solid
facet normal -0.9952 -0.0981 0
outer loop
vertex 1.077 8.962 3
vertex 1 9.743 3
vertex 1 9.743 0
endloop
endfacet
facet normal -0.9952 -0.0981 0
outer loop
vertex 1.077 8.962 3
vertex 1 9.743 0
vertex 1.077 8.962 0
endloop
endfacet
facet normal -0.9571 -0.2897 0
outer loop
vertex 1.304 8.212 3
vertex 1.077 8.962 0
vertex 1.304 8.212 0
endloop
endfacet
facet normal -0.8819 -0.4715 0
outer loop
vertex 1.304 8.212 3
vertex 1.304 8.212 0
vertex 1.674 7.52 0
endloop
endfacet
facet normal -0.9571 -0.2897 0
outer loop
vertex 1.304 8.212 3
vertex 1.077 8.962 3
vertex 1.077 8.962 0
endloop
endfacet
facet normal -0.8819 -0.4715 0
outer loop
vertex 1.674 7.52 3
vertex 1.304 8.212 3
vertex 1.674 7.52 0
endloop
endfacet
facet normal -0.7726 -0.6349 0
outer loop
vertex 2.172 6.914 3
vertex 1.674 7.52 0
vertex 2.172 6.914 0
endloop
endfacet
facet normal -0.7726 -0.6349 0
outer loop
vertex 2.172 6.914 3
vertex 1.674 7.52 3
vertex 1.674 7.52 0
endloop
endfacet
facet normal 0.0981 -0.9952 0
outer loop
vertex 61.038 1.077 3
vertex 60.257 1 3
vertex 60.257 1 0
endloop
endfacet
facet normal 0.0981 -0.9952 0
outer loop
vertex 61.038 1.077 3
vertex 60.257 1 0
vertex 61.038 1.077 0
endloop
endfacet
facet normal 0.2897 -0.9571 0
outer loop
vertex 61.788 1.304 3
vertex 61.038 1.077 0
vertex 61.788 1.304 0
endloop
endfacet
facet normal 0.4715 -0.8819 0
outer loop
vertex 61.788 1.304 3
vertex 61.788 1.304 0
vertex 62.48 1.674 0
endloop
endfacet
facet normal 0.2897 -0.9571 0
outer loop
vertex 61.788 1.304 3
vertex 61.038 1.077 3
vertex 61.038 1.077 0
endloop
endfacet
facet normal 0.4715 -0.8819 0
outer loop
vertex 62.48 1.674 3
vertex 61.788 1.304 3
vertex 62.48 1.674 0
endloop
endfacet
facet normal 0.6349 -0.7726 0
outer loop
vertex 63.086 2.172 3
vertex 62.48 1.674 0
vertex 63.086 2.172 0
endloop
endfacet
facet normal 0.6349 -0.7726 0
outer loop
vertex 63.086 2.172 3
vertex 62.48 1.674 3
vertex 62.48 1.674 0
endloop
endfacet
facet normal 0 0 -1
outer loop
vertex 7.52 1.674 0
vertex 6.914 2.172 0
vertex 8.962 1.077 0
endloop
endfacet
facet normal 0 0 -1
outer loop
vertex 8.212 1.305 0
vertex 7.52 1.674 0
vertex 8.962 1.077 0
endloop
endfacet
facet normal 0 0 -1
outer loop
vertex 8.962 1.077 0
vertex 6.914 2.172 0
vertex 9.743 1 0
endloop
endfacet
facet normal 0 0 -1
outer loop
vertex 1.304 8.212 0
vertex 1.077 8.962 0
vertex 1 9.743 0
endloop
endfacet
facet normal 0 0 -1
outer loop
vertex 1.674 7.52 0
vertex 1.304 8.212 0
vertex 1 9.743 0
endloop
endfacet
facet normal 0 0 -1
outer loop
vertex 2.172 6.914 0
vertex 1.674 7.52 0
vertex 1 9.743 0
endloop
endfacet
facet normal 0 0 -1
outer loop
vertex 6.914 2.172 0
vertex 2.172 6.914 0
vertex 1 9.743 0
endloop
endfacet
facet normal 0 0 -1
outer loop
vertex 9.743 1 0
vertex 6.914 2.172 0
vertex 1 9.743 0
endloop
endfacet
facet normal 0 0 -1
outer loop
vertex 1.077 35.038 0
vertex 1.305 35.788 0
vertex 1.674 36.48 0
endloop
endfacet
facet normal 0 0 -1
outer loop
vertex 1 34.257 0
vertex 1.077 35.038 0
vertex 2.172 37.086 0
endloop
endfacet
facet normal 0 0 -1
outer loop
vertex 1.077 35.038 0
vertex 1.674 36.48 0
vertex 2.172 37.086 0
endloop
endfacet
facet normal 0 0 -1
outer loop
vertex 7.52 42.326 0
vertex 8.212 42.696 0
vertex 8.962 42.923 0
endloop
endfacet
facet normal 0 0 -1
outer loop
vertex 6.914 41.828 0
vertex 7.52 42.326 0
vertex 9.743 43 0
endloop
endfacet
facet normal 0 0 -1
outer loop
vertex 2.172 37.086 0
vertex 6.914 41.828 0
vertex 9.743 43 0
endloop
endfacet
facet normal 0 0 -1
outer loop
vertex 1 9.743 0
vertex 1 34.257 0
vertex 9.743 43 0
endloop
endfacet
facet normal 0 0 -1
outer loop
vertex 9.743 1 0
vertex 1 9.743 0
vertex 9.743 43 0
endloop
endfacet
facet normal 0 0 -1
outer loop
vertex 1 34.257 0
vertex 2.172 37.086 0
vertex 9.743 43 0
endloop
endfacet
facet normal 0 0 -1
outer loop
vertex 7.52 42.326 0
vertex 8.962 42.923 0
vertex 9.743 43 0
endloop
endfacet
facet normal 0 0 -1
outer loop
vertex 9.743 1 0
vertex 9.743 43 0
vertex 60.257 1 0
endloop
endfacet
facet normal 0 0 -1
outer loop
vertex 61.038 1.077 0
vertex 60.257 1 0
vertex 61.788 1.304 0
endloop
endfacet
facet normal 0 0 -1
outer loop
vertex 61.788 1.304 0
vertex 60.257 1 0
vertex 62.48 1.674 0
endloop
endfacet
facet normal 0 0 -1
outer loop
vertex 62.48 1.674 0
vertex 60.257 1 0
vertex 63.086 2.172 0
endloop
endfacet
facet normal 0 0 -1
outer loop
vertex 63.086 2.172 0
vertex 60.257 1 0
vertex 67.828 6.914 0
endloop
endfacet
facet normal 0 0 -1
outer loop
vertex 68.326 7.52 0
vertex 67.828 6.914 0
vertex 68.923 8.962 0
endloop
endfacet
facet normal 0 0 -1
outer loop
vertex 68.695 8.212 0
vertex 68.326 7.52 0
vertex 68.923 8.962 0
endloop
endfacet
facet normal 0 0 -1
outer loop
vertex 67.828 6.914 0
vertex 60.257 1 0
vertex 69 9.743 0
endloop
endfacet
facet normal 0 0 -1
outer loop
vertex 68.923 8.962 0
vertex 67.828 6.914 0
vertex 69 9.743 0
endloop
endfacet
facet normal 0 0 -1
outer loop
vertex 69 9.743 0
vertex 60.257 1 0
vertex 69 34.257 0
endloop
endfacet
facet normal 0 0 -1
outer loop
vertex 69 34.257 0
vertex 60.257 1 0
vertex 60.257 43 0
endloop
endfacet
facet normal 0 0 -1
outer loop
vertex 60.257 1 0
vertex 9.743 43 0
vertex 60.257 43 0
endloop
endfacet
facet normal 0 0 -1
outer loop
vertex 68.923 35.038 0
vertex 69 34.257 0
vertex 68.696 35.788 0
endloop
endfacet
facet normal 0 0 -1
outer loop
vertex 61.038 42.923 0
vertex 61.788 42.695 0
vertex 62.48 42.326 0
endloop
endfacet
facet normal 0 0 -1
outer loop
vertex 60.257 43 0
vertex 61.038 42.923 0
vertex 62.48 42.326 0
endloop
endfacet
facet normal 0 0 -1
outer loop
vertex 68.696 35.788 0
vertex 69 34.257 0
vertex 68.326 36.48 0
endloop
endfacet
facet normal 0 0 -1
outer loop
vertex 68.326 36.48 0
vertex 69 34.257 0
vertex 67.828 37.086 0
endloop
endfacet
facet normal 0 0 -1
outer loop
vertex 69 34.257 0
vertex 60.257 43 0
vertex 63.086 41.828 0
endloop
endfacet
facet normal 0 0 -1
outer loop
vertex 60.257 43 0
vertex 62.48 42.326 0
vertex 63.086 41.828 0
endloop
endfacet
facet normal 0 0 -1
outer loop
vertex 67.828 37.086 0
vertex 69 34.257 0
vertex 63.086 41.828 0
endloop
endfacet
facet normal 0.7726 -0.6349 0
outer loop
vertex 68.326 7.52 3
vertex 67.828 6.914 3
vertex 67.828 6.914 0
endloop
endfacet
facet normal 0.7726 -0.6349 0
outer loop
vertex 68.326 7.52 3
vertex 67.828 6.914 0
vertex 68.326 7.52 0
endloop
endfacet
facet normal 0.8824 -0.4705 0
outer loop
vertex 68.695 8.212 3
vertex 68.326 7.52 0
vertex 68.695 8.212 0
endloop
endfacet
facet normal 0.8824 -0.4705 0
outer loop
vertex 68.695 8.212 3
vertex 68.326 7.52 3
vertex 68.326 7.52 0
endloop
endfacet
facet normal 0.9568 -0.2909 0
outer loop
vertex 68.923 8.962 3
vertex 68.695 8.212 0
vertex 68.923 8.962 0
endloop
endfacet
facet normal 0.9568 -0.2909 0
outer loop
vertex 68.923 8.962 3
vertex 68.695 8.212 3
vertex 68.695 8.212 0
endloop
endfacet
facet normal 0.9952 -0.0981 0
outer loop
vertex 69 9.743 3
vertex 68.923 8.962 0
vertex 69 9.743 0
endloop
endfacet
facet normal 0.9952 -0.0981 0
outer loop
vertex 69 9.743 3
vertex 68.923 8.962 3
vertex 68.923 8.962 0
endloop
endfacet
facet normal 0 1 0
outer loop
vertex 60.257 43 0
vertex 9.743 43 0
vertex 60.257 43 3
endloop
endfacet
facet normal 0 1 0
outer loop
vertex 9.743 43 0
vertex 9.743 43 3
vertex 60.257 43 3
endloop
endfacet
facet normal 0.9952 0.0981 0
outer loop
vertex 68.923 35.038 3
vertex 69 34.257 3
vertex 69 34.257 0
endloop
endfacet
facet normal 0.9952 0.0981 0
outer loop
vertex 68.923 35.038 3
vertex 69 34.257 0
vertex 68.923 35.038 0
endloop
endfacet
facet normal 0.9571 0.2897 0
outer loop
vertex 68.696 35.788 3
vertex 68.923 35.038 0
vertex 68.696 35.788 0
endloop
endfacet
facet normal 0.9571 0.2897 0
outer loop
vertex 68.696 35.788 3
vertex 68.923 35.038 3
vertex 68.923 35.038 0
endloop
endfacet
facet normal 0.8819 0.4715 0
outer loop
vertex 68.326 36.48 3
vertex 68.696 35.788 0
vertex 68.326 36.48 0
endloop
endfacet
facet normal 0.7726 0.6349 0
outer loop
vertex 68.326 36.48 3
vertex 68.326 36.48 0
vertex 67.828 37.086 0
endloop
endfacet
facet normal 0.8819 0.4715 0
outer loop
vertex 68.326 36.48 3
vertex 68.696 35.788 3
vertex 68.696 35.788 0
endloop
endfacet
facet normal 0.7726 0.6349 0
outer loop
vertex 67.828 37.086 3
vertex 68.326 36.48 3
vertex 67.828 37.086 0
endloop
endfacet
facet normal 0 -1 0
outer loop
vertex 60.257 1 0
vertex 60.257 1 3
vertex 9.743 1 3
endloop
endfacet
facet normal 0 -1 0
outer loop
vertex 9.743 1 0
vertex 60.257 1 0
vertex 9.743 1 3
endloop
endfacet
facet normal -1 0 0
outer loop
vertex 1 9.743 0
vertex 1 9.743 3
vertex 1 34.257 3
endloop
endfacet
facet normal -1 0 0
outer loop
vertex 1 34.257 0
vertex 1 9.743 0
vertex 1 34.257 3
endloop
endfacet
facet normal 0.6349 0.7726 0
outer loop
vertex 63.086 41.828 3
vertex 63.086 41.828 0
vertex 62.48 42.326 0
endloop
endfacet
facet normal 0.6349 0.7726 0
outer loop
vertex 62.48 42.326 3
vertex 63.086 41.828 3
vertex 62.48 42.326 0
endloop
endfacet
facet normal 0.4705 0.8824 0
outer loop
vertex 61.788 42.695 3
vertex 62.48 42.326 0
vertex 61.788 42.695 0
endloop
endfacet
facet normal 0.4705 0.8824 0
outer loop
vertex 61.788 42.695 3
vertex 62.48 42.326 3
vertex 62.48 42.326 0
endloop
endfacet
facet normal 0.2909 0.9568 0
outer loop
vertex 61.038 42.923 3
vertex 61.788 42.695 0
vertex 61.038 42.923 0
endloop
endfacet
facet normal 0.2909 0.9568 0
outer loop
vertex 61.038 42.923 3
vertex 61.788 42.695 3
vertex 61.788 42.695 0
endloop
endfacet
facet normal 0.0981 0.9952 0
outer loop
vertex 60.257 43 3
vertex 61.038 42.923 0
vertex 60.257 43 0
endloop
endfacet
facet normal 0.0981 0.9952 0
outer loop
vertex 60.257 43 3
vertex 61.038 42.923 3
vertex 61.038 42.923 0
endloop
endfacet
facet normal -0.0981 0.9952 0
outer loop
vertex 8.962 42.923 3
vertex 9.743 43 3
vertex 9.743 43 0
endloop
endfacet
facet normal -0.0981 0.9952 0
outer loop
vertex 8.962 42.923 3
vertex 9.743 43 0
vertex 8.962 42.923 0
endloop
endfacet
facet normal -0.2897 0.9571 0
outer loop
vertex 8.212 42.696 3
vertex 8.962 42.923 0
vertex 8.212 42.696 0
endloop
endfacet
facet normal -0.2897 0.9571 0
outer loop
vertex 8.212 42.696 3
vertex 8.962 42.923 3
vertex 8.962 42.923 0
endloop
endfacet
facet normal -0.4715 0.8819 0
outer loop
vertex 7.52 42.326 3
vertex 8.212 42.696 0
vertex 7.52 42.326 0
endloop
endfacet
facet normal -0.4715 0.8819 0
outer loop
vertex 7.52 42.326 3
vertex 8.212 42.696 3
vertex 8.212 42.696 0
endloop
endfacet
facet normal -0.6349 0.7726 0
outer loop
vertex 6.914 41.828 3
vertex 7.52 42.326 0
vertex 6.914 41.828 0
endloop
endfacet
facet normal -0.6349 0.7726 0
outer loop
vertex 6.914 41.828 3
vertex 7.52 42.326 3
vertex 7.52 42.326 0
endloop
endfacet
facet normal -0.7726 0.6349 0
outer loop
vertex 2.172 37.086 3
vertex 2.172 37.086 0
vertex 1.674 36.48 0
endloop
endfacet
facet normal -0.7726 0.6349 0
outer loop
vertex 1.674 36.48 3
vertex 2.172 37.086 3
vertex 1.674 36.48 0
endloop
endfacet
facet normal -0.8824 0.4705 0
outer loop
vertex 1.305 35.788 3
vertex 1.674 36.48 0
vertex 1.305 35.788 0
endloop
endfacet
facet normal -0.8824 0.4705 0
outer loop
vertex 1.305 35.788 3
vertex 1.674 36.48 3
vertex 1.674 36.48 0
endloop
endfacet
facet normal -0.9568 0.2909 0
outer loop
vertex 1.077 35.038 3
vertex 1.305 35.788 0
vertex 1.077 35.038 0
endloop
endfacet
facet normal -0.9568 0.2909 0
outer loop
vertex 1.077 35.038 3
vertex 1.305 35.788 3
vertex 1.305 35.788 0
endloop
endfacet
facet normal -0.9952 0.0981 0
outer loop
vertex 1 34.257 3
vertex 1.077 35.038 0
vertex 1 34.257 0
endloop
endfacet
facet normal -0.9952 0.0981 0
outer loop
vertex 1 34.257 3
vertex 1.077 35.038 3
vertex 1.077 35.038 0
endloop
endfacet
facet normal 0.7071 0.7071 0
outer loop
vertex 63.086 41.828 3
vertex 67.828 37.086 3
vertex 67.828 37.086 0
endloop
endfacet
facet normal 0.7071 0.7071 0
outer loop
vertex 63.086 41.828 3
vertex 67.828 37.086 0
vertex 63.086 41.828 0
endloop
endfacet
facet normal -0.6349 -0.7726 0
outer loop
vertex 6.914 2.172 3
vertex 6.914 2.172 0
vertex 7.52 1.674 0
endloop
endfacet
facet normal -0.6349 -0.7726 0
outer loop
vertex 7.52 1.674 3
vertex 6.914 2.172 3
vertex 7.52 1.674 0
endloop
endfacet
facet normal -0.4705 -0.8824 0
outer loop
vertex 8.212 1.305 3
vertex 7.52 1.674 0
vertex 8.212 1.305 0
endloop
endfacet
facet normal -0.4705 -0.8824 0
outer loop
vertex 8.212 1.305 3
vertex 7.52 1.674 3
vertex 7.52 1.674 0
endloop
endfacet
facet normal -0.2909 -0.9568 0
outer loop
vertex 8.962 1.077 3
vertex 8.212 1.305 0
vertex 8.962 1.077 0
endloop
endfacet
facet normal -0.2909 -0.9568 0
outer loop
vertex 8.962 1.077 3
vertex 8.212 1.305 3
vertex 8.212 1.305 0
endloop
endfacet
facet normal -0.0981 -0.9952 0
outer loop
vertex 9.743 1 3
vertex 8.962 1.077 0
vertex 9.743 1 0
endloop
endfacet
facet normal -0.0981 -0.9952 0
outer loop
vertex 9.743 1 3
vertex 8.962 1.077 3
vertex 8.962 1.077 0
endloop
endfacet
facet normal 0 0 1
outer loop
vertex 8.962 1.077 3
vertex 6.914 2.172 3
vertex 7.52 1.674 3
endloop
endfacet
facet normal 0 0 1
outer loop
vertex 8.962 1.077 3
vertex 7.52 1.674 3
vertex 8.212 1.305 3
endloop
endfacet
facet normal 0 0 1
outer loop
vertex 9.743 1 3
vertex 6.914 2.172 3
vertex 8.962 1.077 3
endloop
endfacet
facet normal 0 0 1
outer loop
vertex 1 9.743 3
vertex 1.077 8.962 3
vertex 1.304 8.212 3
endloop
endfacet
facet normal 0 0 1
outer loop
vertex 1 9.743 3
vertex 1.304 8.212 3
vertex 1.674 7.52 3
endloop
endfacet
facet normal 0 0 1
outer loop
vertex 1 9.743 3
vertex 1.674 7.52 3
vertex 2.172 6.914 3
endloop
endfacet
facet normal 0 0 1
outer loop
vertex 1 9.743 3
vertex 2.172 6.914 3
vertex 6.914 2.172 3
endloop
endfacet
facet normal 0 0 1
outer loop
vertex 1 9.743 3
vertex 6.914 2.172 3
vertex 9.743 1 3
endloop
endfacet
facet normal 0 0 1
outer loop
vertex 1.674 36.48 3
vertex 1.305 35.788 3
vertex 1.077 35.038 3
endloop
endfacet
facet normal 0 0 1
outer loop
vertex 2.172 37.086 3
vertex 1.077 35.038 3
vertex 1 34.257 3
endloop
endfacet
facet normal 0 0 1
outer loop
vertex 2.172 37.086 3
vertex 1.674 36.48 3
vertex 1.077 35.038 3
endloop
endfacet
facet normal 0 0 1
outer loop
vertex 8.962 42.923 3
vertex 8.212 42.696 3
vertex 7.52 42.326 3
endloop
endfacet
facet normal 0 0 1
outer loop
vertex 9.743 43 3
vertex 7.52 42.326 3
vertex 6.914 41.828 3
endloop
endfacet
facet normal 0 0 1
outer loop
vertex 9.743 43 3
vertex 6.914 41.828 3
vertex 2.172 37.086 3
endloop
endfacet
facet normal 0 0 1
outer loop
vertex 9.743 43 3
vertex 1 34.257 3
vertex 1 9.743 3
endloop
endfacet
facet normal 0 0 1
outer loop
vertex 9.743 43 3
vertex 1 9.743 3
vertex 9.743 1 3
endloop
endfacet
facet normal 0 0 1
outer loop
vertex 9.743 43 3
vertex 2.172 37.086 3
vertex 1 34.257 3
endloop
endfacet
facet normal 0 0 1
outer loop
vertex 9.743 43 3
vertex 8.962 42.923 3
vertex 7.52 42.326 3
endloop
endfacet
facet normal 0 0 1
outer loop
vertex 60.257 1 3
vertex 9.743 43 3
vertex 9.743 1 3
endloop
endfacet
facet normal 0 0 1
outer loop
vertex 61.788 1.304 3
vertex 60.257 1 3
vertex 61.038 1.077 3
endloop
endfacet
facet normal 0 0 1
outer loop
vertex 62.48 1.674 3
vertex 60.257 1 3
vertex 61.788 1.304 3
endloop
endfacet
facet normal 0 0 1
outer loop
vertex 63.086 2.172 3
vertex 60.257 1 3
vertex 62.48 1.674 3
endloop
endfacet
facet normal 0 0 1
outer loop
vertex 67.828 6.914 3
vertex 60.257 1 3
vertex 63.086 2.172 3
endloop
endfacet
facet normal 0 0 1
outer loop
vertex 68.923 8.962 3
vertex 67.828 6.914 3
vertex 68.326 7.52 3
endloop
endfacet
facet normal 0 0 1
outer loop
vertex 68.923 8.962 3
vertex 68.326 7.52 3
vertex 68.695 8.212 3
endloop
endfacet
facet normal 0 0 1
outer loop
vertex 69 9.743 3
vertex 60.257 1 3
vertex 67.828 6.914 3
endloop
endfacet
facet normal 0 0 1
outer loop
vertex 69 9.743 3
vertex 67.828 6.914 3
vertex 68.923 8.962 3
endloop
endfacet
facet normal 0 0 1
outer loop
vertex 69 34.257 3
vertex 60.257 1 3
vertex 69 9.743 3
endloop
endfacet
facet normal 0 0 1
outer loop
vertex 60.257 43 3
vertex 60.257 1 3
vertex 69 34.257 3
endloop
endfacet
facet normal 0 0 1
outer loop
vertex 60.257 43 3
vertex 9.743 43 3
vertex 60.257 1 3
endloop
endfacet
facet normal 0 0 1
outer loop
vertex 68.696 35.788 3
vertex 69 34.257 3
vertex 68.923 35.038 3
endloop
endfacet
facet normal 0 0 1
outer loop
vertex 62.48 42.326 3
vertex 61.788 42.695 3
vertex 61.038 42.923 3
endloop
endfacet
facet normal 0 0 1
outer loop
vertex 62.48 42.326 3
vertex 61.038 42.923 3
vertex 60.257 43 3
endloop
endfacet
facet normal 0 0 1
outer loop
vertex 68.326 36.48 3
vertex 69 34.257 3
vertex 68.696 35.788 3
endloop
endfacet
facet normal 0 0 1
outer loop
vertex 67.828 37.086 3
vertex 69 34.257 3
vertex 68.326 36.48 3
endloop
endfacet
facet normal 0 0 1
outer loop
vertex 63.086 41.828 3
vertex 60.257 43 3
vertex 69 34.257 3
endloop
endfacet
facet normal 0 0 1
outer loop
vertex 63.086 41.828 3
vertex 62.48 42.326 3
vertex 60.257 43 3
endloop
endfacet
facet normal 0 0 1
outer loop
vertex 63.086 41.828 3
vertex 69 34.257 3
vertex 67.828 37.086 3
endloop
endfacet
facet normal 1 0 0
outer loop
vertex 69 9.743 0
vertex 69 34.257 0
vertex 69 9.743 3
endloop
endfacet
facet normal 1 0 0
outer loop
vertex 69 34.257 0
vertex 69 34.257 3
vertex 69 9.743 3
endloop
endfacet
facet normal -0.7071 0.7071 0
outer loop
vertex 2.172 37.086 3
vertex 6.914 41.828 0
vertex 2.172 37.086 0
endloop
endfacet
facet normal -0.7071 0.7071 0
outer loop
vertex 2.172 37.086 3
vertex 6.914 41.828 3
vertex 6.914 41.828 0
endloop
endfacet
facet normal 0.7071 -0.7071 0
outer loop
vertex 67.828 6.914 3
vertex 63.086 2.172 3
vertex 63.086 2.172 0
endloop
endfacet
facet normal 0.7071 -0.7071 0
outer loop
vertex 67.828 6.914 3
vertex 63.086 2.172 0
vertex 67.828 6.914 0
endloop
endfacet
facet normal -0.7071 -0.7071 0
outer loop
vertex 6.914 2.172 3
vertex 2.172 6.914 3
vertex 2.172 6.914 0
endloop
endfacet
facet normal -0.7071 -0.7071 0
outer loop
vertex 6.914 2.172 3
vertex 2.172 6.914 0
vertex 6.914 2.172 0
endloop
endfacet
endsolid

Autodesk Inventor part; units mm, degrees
ref_plane "YZ Plane" through (0, 0, 0) normal (1, 0, 0) x (0, 1, 0)
ref_plane "XZ Plane" through (0, 0, 0) normal (0, 1, 0) x (-1, 0, 0)
ref_plane "XY Plane" through (0, 0, 0) normal (0, 0, 1) x (1, 0, 0)
sketch "Boceto1" plane through (0, 0, 0) normal (0, 0, 1) x (1, 0, 0)
  line L0 (3, 0) -> (67, 0)
  line L1 (70, 3) -> (70, 41)
  line L2 (67, 44) -> (3, 44)
  line L3 (0, 41) -> (0, 3)
  arc A0 (3, 44) -> (0, 41) centre (3, 41) ccw
  arc A1 (0, 3) -> (3, 0) centre (3, 3) ccw
  arc A2 (67, 0) -> (70, 3) centre (67, 3) ccw
  arc A3 (70, 41) -> (67, 44) centre (67, 41) ccw
  point P0 (0, 0)
  point P1 (70, 44)
  point P2 (70, 0)
  point P3 (0, 44)
  dimension "d0" = 70
  dimension "d1" = 44
  dimension "d2" = 3
extrude "Extrusión1" add sketch "Boceto1" along normal blind 3
sketch "Boceto2" plane through (0, 0, 3) normal (0, 0, 1) x (1, 0, 0)
  line L0 (0, 41) -> (0, 3) projected
  arc A0 (0, 3) -> (3, 0) centre (3, 3) ccw projected
  line L1 (3, 0) -> (67, 0) projected
  arc A1 (67, 0) -> (70, 3) centre (67, 3) ccw projected
  line L2 (70, 3) -> (70, 41) projected
  arc A2 (70, 41) -> (67, 44) centre (67, 41) ccw projected
  line L3 (67, 44) -> (3, 44) projected
  arc A3 (3, 44) -> (0, 41) centre (3, 41) ccw projected
  line L4 (3, 43) -> (67, 43)
  arc A4 (69, 41) -> (67, 43) centre (67, 41) ccw
  line L5 (69, 41) -> (69, 3)
  arc A5 (67, 1) -> (69, 3) centre (67, 3) ccw
  line L6 (67, 1) -> (3, 1)
  arc A6 (1, 3) -> (3, 1) centre (3, 3) ccw
  line L7 (1, 3) -> (1, 41)
  arc A7 (3, 43) -> (1, 41) centre (3, 41) ccw
  point P0 (0, 0)
  dimension "d5" = 1
extrude "Extrusión2" cut sketch "Boceto2" against normal through all
sketch "Boceto5" plane through (0, 0, 3) normal (0, 0, 1) x (1, 0, 0)
  arc A0 (3, 43) -> (1, 41) centre (3, 41) ccw projected
  line L0 (1, 41) -> (1, 3) projected
  arc A1 (1, 3) -> (3, 1) centre (3, 3) ccw projected
  line L1 (3, 1) -> (67, 1) projected
  arc A2 (67, 1) -> (69, 3) centre (67, 3) ccw projected
  line L2 (69, 3) -> (69, 41) projected
  arc A3 (69, 41) -> (67, 43) centre (67, 41) ccw projected
  line L3 (67, 43) -> (3, 43) projected
  arc A4 (2.1716, 37.0858) -> (1, 34.2574) centre (5, 34.2574) ccw
  line L4 (1, 34.2574) -> (1, 9.7426)
  arc A5 (1, 9.7426) -> (2.1716, 6.9142) centre (5, 9.7426) ccw
  line L5 (2.1716, 6.9142) -> (6.9142, 2.1716)
  arc A6 (6.9142, 2.1716) -> (9.7426, 1) centre (9.7426, 5) ccw
  line L6 (9.7426, 1) -> (60.2574, 1)
  arc A7 (60.2574, 1) -> (63.0858, 2.1716) centre (60.2574, 5) ccw
  line L7 (63.0858, 2.1716) -> (67.8284, 6.9142)
  arc A8 (67.8284, 6.9142) -> (69, 9.7426) centre (65, 9.7426) ccw
  line L8 (69, 9.7426) -> (69, 34.2574)
  arc A9 (69, 34.2574) -> (67.8284, 37.0858) centre (65, 34.2574) ccw
  line L9 (67.8284, 37.0858) -> (63.0858, 41.8284)
  arc A10 (63.0858, 41.8284) -> (60.2574, 43) centre (60.2574, 39) ccw
  line L10 (60.2574, 43) -> (9.7426, 43)
  arc A11 (9.7426, 43) -> (6.9142, 41.8284) centre (9.7426, 39) ccw
  line L11 (6.9142, 41.8284) -> (2.1716, 37.0858)
  arc A12 (2.8787, 36.3787) -> (2, 34.2574) centre (5, 34.2574) ccw
  line L12 (2, 34.2574) -> (2, 9.7426)
  arc A13 (2, 9.7426) -> (2.8787, 7.6213) centre (5, 9.7426) ccw
  line L13 (2.8787, 7.6213) -> (7.6213, 2.8787)
  arc A14 (7.6213, 2.8787) -> (9.7426, 2) centre (9.7426, 5) ccw
  line L14 (9.7426, 2) -> (60.2574, 2)
  arc A15 (60.2574, 2) -> (62.3787, 2.8787) centre (60.2574, 5) ccw
  line L15 (62.3787, 2.8787) -> (67.1213, 7.6213)
  arc A16 (67.1213, 7.6213) -> (68, 9.7426) centre (65, 9.7426) ccw
  line L16 (68, 9.7426) -> (68, 34.2574)
  arc A17 (68, 34.2574) -> (67.1213, 36.3787) centre (65, 34.2574) ccw
  line L17 (67.1213, 36.3787) -> (62.3787, 41.1213)
  arc A18 (62.3787, 41.1213) -> (60.2574, 42) centre (60.2574, 39) ccw
  line L18 (60.2574, 42) -> (9.7426, 42)
  arc A19 (9.7426, 42) -> (7.6213, 41.1213) centre (9.7426, 39) ccw
  line L19 (7.6213, 41.1213) -> (2.8787, 36.3787)
  point P0 (0, 0)
  dimension "d0" = 70
  dimension "d1" = 44
  dimension "d2" = 3
  dimension "d23" = 1
  dimension "d24" = 4
  dimension "d25" = 8.7426
  dimension "d26" = 4
  dimension "d27" = 8.7426
  dimension "d28" = 4
  dimension "d29" = 4
  dimension "d30" = 8.7426
  dimension "d31" = 4
  dimension "d32" = 8.7426
  dimension "d33" = 4
  dimension "d34" = 4
  dimension "d35" = 8.7426
  dimension "d36" = 8.7426
  dimension "d37" = 4
  dimension "d38" = 8.7426
  dimension "d39" = 8.7426
  dimension "d40" = 4
  dimension "d41" = 4
  dimension "d42" = 4
  dimension "d43" = 1
  dimension "d44" = 1
  dimension "d45" = 4
  dimension "d46" = 4
  dimension "d47" = 1
  dimension "d48" = 4
  dimension "d49" = 4
  dimension "d50" = 4
  dimension "d51" = 45
  dimension "d52" = 45
  dimension "d53" = 45
  dimension "d54" = 45
  dimension "d55" = 90
  dimension "d56" = 90
extrude "Extrusión4" cut sketch "Boceto5" against normal through all contours L3 A11 L11 A4 L0 A0 | L3 A3 L2 A9 L9 A10 | A5 L5 A6 L1 A1 L0 | L2 A2 L1 A7 L7 A8
properties part number "3d_DAA - Enclosure Glass"
